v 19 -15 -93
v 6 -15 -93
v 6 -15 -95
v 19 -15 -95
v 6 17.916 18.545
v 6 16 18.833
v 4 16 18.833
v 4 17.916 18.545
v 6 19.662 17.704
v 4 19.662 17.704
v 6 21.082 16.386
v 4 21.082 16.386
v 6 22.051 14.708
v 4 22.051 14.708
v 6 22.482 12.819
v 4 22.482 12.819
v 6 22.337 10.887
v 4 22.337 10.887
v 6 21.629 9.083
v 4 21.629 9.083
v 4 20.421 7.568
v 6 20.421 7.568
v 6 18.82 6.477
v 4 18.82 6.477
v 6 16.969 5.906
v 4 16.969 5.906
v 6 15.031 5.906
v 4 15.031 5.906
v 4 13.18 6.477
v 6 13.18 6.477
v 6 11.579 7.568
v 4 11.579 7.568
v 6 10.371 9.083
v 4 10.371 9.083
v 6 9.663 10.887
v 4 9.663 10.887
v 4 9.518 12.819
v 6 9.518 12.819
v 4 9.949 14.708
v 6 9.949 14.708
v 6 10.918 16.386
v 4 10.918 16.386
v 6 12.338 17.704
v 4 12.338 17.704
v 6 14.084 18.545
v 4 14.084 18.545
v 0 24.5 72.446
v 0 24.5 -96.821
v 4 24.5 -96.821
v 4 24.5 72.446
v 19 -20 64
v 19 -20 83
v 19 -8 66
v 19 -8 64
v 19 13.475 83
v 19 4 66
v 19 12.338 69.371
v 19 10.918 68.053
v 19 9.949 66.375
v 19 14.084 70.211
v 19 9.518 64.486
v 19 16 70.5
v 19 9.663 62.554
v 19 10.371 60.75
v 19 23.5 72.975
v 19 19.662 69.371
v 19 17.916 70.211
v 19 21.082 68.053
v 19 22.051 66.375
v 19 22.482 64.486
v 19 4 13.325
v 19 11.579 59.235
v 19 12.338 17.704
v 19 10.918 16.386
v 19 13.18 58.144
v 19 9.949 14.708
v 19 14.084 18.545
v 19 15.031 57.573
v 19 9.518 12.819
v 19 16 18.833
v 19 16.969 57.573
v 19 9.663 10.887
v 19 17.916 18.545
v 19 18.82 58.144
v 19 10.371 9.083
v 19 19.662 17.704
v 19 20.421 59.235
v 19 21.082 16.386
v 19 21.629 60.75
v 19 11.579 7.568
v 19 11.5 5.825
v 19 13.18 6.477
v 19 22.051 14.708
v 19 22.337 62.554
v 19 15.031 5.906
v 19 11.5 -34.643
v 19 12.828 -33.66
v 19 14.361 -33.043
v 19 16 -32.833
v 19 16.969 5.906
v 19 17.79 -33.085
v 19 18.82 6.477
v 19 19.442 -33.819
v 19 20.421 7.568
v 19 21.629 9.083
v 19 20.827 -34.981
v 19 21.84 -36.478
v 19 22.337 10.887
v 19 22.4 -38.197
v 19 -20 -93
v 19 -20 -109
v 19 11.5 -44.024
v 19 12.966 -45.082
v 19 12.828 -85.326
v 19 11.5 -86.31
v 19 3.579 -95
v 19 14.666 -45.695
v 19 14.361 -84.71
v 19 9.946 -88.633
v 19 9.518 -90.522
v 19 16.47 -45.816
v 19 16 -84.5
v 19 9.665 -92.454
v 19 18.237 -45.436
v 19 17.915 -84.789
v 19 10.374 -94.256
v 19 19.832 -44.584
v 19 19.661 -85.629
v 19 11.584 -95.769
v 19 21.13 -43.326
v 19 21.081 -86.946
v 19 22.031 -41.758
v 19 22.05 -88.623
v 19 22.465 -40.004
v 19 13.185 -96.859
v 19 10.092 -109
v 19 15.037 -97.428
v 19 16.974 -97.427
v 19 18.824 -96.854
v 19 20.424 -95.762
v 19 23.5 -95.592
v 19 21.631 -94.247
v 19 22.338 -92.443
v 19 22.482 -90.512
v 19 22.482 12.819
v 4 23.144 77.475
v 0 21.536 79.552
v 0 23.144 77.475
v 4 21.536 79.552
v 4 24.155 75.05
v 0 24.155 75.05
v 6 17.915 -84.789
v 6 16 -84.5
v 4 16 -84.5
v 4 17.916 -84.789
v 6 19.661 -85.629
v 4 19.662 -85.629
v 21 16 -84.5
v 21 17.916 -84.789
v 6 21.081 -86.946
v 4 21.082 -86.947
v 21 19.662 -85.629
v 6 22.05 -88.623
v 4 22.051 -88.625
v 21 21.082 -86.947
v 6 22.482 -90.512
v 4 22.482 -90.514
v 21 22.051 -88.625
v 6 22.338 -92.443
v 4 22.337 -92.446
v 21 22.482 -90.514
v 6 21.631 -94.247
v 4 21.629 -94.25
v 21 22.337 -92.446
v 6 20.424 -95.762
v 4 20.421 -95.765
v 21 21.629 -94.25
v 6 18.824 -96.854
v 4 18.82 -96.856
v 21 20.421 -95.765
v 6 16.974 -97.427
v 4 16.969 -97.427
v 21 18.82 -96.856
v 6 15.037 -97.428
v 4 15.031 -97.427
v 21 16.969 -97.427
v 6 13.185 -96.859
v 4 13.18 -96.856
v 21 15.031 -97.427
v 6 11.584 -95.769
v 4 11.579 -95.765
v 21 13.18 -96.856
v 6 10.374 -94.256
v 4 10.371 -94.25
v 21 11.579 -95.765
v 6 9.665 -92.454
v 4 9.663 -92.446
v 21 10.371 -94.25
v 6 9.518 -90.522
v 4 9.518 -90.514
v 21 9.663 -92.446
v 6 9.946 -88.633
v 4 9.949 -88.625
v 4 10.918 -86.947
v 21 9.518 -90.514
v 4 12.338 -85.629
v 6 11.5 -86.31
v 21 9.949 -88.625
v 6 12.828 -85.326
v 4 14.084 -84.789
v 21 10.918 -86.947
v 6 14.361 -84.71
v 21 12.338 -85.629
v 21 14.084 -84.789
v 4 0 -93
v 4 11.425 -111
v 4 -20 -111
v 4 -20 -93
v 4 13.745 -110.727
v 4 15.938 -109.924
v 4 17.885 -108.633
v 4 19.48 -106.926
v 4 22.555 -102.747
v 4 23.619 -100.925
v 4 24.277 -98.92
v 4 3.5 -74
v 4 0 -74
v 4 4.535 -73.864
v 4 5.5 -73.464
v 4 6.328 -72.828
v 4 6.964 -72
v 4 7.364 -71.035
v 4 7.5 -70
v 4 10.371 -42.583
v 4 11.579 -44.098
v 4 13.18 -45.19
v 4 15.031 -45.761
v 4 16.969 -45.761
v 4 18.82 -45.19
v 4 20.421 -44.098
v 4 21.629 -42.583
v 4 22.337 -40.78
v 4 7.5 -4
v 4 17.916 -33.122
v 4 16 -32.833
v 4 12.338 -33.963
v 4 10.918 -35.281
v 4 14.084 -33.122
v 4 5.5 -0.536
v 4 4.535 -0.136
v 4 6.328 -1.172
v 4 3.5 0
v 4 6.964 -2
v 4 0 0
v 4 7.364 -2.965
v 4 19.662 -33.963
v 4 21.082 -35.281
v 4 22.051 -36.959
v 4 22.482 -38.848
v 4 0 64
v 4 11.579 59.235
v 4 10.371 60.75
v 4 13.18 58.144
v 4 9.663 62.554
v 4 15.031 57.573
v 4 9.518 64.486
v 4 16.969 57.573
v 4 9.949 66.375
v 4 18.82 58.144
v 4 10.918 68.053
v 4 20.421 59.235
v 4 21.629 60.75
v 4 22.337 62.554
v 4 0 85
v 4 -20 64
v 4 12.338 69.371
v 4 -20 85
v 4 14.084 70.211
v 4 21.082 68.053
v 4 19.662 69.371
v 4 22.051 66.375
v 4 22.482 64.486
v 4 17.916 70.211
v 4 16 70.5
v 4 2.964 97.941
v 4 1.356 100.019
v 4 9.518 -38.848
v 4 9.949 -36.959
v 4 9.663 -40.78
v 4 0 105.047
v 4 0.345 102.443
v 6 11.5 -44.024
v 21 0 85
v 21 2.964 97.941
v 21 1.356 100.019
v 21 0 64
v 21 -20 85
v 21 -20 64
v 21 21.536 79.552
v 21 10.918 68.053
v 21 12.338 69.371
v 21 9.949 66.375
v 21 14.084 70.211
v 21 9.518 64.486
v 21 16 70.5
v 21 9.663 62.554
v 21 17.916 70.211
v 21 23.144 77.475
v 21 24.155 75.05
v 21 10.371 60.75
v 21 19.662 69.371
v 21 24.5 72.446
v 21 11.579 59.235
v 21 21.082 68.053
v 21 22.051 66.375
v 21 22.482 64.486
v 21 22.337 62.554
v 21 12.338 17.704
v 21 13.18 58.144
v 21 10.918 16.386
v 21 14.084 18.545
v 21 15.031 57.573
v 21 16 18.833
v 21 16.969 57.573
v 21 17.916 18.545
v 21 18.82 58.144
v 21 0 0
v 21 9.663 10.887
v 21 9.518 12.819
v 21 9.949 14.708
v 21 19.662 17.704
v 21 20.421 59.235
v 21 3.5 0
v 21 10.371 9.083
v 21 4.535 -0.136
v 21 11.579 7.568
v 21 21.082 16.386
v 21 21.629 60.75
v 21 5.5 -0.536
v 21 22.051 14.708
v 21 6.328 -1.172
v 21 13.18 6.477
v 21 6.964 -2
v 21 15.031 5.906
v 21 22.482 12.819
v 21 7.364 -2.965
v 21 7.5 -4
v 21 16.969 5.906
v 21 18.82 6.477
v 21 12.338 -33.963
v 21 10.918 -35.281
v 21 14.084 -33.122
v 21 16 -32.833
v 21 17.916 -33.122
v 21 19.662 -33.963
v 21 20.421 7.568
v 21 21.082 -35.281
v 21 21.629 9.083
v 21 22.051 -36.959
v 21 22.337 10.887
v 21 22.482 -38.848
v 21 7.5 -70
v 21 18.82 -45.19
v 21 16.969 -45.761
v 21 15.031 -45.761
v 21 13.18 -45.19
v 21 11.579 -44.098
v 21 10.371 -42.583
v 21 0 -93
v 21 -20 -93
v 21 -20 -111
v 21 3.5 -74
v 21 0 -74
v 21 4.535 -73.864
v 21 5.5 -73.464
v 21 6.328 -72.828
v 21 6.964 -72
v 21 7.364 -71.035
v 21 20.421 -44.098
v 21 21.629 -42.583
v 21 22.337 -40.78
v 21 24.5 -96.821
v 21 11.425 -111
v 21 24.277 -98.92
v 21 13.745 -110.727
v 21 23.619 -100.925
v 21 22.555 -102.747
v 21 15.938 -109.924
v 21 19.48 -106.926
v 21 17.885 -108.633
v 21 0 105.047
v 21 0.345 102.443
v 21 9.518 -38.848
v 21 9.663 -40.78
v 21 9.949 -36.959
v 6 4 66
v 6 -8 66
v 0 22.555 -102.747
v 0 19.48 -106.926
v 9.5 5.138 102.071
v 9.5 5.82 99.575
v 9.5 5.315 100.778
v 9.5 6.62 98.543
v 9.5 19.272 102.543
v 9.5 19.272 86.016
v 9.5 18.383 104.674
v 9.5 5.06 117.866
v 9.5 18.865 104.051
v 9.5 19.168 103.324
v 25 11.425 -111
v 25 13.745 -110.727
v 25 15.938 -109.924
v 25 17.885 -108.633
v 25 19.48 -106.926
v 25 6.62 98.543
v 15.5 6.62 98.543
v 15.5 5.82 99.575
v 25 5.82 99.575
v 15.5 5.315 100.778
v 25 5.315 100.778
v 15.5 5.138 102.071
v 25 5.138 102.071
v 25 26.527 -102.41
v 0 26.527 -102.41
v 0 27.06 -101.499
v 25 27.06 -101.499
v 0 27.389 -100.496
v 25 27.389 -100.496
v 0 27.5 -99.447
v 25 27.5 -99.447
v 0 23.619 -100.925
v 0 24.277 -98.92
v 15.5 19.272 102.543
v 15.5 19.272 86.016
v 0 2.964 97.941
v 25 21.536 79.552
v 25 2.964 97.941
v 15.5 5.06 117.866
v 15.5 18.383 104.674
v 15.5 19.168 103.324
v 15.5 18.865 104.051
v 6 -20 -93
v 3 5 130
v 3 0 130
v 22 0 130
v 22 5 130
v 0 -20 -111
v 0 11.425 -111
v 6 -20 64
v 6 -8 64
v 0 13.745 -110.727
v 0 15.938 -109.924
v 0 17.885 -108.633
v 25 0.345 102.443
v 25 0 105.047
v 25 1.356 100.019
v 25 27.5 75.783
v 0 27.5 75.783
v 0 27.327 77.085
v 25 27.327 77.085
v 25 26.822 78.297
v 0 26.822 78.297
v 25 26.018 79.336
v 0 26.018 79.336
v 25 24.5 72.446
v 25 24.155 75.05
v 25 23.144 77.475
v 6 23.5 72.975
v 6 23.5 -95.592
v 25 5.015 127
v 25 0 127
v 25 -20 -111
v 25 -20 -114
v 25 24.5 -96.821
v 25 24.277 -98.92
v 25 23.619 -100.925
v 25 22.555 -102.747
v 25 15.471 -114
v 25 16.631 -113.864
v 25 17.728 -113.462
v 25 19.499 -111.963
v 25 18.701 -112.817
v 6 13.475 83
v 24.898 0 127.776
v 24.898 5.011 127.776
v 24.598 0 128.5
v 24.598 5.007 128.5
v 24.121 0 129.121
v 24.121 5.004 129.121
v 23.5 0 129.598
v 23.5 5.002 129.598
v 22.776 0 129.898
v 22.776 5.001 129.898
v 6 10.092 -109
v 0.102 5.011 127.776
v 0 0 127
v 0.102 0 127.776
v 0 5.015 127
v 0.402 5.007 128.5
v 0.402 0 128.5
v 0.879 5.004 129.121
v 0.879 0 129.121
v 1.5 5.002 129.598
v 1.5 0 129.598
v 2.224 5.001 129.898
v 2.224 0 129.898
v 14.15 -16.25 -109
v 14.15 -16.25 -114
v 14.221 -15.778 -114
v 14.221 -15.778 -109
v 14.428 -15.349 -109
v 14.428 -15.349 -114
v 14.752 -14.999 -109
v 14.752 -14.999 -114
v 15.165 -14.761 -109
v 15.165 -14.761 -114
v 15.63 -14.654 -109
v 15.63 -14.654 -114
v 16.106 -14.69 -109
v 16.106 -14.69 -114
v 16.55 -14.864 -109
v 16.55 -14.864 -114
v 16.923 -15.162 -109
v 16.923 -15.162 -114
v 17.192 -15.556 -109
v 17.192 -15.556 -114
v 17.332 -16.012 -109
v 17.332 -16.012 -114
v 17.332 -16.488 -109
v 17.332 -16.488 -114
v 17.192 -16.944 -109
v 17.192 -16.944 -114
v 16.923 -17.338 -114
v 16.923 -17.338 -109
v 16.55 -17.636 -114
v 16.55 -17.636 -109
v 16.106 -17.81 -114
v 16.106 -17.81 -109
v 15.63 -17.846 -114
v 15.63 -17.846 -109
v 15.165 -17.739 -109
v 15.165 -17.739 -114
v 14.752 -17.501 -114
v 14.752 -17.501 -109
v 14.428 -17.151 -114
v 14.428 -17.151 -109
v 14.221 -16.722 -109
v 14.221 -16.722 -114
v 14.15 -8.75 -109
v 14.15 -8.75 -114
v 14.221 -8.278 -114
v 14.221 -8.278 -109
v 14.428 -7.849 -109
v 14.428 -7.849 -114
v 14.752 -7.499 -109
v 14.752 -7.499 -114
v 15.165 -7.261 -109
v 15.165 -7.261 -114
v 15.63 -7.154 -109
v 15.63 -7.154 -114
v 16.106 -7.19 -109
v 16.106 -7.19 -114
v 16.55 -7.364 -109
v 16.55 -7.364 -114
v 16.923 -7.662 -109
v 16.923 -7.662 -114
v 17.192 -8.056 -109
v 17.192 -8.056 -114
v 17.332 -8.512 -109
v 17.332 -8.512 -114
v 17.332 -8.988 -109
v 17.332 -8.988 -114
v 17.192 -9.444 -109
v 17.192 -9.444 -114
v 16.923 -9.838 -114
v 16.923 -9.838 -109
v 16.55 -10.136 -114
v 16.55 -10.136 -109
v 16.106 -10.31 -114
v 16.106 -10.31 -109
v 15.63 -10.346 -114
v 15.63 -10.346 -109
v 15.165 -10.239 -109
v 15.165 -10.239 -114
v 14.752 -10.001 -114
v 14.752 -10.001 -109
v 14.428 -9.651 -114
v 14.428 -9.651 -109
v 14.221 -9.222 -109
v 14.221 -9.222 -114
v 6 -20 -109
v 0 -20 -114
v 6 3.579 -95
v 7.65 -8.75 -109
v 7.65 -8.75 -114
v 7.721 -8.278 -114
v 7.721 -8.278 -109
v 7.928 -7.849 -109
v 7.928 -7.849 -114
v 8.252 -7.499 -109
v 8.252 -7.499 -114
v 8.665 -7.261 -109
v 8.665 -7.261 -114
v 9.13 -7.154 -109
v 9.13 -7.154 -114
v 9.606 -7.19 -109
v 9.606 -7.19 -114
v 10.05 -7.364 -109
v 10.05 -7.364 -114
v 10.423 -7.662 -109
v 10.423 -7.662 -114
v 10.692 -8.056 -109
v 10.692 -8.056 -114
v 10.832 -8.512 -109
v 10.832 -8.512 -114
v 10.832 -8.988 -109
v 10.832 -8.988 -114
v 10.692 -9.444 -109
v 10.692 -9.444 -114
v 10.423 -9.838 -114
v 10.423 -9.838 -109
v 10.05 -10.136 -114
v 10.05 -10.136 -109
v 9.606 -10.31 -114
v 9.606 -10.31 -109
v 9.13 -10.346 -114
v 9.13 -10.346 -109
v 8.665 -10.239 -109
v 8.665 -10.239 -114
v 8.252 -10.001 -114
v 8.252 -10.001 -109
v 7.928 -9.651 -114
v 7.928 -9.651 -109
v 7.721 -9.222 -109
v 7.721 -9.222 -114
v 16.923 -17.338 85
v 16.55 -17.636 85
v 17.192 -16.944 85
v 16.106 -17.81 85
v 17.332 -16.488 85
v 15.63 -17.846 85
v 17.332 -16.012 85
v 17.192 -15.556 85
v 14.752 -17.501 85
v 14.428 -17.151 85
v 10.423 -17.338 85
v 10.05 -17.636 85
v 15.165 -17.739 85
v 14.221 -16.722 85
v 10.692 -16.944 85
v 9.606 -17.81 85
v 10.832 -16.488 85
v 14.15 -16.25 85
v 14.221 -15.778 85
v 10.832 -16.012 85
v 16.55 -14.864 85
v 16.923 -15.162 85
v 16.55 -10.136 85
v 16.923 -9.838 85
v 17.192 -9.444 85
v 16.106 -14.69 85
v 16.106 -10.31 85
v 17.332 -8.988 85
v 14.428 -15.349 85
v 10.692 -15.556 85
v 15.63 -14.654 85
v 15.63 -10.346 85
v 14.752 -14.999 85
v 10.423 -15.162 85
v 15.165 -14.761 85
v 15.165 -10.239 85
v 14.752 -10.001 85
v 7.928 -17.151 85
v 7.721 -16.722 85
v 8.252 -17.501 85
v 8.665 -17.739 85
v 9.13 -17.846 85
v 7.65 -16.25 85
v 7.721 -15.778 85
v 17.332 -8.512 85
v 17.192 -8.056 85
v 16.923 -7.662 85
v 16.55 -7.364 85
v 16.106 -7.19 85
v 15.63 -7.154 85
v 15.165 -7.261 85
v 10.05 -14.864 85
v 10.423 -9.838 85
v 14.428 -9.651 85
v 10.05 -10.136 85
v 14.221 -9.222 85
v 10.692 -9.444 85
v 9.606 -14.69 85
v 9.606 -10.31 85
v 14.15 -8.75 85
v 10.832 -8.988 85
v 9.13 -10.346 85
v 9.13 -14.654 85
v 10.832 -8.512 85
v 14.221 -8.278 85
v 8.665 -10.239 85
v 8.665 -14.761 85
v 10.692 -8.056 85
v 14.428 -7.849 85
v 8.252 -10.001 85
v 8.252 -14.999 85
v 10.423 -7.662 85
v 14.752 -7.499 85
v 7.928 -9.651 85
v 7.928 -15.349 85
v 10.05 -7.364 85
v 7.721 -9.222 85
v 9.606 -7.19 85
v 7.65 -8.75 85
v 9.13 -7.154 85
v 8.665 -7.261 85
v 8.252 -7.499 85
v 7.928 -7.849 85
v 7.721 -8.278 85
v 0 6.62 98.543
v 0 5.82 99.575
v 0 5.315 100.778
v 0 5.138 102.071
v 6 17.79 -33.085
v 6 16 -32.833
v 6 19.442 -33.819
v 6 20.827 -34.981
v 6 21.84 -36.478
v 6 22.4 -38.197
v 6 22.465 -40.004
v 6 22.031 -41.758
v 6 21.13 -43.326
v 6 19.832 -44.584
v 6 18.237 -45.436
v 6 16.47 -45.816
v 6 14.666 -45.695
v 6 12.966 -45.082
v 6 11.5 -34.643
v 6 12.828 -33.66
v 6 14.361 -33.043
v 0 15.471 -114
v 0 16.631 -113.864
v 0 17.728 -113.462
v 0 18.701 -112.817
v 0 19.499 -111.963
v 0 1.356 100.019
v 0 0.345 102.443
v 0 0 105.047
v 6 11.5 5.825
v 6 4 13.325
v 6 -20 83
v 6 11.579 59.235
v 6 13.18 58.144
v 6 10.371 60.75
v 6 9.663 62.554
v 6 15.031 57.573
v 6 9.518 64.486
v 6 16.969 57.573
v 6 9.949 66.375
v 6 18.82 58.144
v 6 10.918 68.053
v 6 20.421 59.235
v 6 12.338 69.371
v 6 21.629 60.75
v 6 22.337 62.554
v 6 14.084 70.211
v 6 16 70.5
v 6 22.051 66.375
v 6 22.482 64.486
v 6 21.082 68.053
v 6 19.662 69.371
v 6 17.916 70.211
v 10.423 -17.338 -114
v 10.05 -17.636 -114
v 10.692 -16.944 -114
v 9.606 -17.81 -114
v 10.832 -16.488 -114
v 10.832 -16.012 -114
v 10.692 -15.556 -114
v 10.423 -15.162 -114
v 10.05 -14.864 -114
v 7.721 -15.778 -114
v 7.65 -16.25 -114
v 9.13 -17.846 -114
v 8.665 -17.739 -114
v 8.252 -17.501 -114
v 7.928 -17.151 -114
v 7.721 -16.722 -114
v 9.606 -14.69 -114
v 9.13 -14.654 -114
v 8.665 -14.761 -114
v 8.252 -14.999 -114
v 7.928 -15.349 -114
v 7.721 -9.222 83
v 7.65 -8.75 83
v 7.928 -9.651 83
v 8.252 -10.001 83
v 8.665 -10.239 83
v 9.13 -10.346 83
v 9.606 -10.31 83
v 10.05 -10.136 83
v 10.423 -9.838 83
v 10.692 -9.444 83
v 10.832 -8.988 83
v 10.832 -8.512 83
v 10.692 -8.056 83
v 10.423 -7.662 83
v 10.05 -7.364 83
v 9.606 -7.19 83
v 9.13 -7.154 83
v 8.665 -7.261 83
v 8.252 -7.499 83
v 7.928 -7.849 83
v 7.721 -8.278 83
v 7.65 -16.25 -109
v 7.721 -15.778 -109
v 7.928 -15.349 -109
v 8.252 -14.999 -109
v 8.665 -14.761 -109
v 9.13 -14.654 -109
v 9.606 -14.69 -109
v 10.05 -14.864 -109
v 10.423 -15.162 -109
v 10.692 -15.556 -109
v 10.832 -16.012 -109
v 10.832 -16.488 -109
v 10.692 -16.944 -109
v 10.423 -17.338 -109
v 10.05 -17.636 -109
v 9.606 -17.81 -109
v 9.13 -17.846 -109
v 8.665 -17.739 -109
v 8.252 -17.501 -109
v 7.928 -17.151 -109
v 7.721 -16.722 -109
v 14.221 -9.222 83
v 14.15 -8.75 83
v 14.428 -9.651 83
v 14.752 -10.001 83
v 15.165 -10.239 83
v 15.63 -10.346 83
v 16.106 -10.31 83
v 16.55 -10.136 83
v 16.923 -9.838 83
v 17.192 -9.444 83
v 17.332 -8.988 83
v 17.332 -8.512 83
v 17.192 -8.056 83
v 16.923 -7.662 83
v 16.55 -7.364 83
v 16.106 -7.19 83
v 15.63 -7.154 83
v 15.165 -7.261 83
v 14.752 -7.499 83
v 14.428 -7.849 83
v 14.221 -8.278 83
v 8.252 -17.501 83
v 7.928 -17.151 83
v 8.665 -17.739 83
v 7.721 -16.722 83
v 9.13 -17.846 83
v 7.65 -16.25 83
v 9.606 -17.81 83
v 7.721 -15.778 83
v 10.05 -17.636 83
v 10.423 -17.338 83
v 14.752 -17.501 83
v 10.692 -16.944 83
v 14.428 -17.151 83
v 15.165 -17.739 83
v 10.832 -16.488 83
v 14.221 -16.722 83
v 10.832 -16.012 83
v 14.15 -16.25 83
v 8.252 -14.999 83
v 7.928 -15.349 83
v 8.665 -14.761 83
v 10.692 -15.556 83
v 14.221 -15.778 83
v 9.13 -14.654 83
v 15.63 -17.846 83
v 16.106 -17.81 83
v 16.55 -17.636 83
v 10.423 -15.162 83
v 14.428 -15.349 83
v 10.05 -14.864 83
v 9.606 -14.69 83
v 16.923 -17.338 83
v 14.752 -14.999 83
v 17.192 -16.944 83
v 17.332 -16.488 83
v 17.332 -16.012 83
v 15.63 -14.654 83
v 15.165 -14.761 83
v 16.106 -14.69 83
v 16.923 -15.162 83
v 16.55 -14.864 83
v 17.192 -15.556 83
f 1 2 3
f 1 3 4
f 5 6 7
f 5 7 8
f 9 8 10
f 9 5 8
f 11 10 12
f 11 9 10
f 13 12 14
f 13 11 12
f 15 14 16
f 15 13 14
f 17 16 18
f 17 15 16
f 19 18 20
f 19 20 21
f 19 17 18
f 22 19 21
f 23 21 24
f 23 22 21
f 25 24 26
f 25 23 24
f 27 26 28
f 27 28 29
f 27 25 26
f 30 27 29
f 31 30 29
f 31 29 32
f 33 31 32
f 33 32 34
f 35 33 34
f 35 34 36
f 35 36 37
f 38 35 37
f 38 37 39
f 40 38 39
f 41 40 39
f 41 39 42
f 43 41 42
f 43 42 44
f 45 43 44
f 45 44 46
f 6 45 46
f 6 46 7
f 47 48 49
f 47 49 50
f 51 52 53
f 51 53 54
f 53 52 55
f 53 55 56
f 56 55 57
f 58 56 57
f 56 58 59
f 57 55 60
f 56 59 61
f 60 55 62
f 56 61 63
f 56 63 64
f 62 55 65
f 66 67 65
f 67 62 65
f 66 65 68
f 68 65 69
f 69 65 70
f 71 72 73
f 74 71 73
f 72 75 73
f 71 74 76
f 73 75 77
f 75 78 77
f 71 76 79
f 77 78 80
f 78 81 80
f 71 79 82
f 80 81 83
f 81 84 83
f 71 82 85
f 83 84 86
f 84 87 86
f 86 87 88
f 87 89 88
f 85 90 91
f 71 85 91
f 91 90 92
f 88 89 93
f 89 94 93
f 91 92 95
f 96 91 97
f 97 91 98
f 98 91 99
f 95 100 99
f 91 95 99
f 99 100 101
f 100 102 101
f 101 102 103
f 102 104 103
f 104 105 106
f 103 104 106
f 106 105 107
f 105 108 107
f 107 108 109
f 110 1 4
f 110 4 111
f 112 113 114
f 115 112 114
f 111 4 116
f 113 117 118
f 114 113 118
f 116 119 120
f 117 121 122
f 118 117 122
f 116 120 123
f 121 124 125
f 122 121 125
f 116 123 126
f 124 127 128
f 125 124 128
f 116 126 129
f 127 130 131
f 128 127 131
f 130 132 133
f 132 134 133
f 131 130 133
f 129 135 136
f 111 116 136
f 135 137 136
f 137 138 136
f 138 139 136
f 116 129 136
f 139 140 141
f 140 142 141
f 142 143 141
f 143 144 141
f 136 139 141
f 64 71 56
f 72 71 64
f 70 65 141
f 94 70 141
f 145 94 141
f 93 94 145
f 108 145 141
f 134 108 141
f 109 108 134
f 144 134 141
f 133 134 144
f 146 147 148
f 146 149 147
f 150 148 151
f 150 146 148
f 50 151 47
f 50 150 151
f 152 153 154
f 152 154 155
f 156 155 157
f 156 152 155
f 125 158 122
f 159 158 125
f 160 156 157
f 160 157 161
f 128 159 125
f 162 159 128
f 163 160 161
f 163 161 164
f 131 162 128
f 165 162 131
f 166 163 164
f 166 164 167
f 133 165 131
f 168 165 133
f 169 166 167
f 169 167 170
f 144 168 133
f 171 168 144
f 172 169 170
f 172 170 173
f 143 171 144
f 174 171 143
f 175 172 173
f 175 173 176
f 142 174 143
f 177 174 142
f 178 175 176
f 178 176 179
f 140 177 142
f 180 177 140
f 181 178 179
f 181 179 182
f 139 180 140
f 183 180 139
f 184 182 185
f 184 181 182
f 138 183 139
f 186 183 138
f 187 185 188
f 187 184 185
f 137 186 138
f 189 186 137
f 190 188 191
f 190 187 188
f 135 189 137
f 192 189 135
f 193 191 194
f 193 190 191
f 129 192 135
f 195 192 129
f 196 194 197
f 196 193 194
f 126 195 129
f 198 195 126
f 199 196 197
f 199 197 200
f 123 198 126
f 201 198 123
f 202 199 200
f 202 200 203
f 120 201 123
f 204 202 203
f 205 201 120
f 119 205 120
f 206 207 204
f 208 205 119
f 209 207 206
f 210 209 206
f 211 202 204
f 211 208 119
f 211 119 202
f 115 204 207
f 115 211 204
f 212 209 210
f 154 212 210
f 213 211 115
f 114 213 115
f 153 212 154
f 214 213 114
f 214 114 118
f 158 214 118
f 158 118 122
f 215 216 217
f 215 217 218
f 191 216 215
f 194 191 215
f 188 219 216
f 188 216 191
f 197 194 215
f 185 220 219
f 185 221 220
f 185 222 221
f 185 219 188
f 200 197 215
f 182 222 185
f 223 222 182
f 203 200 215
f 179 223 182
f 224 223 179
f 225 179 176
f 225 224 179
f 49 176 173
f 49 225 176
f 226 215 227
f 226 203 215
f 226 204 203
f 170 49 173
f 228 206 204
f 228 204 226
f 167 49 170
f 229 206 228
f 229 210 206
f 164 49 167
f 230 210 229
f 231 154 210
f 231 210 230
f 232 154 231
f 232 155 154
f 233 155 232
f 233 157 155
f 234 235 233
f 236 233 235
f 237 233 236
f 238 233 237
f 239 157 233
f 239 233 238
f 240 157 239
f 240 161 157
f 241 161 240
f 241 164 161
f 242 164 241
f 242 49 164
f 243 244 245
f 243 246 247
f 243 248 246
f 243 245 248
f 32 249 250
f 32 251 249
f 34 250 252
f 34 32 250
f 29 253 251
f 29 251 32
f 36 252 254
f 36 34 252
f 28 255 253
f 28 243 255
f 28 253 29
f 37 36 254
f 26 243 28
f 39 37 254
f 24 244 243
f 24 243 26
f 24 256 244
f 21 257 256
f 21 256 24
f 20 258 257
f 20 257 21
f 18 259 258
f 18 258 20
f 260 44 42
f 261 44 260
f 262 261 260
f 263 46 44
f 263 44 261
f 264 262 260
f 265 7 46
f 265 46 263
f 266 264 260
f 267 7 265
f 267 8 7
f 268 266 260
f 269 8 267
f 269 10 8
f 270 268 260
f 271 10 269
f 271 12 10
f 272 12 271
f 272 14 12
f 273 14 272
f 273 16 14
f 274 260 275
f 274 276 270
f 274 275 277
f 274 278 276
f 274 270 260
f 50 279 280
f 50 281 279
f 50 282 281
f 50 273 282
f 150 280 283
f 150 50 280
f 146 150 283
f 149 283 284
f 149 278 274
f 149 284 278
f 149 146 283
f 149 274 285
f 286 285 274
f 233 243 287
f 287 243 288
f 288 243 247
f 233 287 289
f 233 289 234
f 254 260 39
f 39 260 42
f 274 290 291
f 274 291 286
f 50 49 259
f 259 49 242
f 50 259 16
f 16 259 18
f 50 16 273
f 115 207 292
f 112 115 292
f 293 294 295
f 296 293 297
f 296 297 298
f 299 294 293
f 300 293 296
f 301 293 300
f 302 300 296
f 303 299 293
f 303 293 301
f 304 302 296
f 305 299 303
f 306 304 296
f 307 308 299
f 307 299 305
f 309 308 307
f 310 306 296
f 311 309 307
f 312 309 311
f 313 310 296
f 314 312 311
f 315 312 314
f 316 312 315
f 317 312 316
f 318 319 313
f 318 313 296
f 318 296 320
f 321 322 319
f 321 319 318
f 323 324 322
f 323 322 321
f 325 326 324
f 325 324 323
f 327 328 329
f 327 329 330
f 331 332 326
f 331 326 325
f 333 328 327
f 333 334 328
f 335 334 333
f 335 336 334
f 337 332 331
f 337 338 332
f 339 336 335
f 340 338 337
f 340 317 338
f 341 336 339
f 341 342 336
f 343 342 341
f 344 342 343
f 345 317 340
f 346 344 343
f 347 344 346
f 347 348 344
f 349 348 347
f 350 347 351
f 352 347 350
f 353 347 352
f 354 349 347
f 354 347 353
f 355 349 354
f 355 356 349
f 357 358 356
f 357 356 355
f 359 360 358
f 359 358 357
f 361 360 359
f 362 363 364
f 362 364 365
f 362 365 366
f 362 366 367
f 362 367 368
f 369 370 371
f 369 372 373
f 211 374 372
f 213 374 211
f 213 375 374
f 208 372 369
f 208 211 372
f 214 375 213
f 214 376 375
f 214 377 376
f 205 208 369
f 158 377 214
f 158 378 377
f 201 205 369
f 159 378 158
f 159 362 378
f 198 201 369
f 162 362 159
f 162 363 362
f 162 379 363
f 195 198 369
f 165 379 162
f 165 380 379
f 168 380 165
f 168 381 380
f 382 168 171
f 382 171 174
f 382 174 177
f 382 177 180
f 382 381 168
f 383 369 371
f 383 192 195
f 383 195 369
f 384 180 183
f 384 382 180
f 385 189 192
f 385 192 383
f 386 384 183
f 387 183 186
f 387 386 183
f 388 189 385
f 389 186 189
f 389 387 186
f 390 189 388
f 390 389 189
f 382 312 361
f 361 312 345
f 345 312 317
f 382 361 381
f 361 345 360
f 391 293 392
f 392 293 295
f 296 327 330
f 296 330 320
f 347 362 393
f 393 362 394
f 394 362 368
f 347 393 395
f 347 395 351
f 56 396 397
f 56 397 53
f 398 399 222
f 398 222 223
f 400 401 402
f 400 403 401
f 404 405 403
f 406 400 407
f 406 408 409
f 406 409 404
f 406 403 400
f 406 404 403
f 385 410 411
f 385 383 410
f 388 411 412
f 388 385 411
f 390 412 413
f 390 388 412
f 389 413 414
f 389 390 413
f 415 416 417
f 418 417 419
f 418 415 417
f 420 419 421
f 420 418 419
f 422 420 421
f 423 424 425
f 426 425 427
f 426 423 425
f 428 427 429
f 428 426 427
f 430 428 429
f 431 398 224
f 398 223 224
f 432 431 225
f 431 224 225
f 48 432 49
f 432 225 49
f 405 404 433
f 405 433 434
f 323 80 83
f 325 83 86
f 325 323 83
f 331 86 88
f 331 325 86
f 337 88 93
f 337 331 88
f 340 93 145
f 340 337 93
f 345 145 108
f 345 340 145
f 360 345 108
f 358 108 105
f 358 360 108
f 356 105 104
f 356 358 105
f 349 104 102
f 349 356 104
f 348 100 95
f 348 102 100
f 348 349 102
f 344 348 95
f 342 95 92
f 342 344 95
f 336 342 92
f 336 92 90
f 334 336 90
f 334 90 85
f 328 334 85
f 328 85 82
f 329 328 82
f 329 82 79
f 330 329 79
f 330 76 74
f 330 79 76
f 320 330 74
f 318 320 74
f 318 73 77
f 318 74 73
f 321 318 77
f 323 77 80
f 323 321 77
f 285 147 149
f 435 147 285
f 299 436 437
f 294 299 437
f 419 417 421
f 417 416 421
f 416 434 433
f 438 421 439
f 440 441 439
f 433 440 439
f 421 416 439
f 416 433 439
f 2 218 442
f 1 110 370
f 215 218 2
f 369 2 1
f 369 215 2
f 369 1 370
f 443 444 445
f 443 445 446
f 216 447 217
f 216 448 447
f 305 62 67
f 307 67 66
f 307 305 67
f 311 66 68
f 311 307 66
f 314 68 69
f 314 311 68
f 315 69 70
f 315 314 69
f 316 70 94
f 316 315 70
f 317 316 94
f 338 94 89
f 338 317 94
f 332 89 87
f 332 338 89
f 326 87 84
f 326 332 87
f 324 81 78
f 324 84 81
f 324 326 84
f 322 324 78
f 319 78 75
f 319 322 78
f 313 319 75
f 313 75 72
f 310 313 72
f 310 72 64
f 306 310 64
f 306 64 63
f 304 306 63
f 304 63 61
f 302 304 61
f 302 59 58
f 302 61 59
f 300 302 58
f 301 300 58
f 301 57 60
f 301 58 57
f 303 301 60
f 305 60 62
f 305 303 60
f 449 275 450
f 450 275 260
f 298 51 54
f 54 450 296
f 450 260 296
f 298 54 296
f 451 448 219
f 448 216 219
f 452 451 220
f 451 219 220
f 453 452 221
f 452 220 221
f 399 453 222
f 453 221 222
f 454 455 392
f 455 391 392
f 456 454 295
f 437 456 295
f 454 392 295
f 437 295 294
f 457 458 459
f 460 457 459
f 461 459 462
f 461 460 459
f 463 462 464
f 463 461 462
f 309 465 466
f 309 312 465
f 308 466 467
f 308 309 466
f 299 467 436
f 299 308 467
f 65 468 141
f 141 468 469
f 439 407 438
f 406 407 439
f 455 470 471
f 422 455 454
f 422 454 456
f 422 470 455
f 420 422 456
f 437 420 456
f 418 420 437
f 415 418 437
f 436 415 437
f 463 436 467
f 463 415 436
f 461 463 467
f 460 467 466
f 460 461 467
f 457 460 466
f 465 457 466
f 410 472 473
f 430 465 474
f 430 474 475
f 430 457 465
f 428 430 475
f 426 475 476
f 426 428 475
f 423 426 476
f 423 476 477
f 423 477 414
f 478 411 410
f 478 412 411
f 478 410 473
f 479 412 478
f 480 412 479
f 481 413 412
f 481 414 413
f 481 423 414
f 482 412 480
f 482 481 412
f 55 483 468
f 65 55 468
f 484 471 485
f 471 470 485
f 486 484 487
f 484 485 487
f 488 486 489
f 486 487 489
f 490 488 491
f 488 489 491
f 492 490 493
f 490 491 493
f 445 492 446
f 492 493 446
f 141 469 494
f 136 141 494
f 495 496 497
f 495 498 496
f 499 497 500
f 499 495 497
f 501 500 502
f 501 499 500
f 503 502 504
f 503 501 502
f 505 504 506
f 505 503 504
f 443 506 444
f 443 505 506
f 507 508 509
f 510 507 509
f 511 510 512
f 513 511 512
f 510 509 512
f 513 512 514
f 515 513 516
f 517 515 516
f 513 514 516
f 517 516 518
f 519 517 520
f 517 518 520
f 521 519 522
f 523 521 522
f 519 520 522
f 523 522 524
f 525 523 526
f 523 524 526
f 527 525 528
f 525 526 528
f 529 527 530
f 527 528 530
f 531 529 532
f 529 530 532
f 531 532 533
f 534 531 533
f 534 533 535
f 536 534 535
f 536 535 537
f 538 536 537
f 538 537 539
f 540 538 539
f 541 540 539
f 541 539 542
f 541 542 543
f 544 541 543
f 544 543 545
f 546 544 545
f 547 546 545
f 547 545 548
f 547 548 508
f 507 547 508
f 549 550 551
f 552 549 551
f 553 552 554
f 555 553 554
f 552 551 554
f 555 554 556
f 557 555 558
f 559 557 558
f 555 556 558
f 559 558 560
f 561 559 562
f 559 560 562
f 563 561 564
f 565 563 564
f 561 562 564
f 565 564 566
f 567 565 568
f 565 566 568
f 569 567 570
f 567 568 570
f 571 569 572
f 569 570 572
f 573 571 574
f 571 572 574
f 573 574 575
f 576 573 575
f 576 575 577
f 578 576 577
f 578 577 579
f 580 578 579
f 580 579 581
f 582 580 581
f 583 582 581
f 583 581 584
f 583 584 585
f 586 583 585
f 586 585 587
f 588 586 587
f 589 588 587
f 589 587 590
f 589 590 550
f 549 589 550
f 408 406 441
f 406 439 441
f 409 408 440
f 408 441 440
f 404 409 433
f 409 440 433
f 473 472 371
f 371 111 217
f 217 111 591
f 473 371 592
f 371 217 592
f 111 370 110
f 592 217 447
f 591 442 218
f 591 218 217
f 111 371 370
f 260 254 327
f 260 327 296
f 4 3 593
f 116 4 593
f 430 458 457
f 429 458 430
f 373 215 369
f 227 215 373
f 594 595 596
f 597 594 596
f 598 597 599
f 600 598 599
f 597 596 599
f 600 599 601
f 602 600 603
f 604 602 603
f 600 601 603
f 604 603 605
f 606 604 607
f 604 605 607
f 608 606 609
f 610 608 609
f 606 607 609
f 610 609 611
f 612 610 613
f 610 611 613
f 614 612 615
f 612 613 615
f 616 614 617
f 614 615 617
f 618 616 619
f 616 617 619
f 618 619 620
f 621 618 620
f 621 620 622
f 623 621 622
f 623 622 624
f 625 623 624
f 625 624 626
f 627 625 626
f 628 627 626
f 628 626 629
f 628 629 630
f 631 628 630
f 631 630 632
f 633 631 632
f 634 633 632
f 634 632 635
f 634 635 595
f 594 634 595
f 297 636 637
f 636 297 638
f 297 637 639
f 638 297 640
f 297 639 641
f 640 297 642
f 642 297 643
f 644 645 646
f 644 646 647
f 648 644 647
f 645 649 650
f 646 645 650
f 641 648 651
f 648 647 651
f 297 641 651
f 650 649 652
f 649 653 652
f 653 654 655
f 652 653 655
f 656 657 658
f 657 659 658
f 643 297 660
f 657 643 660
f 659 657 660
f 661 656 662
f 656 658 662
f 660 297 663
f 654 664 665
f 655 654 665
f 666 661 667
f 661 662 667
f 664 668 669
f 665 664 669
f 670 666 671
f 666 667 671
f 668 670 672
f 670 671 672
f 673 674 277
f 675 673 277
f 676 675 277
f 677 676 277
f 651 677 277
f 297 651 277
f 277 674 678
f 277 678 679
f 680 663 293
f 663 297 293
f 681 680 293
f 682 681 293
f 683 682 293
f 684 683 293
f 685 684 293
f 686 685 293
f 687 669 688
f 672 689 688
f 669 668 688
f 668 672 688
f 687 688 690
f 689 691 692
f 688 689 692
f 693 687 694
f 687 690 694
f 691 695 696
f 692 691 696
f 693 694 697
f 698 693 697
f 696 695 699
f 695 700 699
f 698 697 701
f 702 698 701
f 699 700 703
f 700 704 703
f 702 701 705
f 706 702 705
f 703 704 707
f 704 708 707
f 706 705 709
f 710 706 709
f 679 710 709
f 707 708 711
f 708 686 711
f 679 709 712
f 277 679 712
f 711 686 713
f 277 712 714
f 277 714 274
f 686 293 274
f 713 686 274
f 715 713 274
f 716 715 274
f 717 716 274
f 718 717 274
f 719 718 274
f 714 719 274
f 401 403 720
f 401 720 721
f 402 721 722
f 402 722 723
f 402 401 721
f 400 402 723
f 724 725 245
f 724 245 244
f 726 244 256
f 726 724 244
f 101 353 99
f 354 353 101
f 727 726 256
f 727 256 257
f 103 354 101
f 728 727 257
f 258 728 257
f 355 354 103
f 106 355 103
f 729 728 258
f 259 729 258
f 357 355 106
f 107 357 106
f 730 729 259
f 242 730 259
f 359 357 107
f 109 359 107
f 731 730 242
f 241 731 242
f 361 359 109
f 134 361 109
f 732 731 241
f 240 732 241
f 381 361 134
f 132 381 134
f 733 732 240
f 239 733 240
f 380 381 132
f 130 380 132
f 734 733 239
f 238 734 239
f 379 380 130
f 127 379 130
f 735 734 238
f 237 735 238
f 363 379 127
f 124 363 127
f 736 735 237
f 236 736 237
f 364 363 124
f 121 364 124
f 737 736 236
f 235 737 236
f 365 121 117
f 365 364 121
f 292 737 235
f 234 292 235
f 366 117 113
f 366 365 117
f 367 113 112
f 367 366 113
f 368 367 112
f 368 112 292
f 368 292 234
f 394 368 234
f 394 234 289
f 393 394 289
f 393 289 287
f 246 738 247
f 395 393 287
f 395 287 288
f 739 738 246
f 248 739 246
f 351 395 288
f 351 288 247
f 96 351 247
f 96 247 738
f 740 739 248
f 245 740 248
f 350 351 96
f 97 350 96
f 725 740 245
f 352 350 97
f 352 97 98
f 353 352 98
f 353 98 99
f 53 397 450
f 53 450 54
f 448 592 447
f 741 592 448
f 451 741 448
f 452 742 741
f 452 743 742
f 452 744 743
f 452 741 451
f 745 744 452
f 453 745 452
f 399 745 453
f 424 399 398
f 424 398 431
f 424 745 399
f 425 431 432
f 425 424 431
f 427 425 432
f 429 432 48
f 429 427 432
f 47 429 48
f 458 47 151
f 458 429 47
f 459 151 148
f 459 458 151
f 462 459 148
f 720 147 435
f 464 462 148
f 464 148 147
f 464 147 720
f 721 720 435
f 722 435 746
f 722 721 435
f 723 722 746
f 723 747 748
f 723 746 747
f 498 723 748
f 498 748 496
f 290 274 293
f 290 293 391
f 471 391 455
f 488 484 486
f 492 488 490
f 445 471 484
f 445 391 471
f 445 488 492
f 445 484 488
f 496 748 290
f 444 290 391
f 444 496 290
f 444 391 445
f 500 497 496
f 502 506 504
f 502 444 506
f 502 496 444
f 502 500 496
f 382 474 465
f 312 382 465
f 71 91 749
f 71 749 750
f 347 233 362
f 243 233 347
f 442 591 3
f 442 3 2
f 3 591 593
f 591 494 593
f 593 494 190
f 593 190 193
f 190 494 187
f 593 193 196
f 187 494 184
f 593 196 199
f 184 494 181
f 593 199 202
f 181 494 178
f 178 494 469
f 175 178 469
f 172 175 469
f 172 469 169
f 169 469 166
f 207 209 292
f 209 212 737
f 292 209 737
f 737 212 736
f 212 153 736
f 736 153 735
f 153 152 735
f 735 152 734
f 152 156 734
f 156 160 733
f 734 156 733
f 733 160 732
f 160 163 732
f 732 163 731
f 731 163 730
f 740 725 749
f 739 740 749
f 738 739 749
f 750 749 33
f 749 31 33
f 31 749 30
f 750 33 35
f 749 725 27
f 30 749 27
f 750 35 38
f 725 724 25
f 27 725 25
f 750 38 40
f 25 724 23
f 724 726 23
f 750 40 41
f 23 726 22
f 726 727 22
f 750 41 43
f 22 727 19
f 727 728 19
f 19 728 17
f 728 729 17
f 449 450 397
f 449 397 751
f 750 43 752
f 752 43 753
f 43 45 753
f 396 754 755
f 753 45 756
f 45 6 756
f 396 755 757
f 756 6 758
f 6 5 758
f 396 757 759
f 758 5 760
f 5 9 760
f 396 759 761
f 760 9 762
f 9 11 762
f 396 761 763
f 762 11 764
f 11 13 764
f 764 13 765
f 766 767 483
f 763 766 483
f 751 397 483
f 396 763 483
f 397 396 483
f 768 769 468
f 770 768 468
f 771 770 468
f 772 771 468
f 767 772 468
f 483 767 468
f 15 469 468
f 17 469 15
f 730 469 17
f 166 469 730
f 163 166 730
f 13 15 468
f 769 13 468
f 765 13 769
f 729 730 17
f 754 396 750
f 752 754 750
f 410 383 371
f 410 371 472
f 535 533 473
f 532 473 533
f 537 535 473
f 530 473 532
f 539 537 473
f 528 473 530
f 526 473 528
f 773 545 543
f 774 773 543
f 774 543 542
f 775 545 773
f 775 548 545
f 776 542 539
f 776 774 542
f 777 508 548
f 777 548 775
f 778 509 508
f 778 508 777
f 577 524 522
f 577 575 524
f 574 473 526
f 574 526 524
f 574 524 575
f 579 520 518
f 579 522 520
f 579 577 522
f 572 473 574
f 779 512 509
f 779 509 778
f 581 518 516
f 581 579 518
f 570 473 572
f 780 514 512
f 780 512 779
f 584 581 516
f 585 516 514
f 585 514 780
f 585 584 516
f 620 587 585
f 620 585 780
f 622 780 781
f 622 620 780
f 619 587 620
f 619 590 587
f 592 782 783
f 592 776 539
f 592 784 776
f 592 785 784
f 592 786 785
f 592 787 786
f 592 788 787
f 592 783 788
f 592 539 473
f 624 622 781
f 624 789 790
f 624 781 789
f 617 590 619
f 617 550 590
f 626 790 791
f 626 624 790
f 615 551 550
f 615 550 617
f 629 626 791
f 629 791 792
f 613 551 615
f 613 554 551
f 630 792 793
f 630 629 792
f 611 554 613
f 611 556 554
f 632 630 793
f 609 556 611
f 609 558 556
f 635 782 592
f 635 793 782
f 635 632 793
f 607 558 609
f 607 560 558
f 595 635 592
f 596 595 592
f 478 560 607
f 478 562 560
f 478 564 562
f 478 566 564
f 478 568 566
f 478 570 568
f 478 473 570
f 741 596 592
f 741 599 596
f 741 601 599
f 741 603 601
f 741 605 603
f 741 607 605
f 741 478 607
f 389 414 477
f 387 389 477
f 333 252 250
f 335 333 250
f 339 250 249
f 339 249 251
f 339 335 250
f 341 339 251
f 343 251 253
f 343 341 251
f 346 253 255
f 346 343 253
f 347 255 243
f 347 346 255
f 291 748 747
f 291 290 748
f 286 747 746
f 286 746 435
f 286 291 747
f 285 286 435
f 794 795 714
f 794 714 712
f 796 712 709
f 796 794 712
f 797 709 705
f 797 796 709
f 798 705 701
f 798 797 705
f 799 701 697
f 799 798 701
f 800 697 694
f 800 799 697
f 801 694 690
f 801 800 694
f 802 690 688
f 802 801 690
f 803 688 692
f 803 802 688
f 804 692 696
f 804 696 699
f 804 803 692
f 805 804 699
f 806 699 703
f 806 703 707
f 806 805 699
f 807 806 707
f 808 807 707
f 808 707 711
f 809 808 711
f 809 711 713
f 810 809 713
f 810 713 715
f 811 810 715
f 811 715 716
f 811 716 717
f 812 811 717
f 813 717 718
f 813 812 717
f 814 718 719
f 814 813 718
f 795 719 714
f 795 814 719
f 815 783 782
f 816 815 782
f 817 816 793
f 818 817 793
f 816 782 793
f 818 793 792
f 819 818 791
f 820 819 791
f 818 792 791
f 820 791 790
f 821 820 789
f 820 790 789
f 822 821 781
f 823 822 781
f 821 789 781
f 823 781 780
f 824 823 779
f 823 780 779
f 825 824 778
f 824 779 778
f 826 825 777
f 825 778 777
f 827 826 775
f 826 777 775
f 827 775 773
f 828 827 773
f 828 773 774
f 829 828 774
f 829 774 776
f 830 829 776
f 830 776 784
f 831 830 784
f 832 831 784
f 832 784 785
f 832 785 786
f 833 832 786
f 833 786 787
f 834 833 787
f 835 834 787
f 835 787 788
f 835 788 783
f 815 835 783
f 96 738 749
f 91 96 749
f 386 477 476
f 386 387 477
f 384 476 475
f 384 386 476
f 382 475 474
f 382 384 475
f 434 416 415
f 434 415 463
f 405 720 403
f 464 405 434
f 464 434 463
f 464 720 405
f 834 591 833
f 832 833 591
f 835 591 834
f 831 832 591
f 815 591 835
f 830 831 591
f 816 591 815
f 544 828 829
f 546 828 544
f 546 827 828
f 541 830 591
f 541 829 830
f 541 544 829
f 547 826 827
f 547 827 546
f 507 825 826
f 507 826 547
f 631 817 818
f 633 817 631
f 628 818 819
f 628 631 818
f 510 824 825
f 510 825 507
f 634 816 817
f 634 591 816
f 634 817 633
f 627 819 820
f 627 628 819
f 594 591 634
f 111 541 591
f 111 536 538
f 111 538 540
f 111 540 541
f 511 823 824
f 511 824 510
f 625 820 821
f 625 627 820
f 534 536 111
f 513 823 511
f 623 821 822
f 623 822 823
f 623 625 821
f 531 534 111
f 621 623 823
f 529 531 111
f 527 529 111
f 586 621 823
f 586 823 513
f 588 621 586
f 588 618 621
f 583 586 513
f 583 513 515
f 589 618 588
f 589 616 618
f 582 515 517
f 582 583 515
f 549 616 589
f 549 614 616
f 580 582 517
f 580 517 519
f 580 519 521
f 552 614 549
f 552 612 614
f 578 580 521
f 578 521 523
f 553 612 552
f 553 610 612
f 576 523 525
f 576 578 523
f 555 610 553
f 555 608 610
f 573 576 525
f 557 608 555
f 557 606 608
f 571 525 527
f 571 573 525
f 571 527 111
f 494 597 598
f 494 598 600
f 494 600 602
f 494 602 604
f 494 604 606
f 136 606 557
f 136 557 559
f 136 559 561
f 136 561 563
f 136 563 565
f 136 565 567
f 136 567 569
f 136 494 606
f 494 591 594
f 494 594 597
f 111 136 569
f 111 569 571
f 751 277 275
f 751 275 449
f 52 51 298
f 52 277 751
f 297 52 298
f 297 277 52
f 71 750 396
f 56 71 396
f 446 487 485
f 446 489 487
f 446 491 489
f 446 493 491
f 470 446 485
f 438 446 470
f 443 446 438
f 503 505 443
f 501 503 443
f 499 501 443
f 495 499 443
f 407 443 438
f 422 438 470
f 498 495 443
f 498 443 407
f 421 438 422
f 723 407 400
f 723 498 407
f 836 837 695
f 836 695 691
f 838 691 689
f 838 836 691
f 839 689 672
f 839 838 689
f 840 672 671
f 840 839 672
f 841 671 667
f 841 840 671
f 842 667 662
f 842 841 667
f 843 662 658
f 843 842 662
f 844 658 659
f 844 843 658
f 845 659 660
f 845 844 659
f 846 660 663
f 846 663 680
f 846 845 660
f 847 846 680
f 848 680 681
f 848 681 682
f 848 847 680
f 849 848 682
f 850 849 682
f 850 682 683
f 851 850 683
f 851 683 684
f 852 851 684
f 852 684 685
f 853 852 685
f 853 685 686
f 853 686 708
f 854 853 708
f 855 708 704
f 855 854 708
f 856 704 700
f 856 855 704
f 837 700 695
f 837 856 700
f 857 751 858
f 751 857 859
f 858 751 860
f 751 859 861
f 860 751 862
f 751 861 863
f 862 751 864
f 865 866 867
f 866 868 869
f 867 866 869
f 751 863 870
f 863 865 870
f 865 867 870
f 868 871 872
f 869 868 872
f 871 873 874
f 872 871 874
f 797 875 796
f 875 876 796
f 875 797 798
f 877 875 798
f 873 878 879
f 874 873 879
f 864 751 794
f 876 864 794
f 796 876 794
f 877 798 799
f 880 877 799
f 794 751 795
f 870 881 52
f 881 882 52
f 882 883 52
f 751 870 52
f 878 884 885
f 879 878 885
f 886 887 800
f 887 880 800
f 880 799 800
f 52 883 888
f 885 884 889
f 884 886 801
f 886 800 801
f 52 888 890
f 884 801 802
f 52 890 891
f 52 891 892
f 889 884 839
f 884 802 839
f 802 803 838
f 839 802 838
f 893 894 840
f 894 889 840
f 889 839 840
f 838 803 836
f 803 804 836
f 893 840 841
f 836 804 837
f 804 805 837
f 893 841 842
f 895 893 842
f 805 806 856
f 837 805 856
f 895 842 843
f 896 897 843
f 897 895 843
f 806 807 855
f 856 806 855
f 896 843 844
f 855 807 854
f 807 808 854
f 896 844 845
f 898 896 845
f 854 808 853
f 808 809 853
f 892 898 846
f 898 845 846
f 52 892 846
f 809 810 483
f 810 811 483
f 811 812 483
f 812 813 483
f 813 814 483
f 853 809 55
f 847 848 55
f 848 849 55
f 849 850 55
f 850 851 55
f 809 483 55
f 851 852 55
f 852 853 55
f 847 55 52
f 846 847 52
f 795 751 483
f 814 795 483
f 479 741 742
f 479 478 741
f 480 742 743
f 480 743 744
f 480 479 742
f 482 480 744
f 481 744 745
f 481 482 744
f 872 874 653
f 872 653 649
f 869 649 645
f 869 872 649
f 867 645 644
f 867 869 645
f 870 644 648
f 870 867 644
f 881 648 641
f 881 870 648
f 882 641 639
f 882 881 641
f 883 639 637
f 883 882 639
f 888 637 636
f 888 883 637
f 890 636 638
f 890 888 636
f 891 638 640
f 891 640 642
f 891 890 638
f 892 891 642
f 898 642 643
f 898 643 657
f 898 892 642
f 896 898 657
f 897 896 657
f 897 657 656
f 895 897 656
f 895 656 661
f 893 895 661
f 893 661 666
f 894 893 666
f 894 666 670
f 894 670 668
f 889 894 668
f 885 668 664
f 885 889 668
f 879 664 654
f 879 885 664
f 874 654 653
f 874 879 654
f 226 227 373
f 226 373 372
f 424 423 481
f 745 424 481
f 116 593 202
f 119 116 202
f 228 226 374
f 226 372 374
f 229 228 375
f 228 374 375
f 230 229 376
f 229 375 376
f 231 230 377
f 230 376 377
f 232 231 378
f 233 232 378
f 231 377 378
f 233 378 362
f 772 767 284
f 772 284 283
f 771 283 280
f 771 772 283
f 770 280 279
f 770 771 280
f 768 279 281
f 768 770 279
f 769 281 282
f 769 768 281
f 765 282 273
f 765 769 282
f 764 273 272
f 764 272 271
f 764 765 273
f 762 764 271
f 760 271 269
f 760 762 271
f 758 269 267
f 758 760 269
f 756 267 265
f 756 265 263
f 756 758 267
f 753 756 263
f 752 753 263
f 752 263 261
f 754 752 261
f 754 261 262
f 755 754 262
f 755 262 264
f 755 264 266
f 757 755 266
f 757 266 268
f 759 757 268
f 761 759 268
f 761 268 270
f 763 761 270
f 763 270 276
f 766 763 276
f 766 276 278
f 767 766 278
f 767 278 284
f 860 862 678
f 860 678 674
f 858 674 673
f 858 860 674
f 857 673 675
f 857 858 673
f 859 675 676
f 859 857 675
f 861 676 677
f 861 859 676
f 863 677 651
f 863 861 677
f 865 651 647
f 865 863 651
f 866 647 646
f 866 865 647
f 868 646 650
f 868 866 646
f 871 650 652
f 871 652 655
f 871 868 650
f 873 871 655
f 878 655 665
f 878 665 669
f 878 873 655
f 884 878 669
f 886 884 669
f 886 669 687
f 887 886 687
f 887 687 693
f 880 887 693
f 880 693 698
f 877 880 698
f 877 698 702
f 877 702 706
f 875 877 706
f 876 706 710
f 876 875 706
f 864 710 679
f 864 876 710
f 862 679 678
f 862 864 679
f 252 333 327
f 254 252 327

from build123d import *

# Parameters (mm, degrees)
BOSS_EXTRUDE1_DEPTH      = 25
CUT_EXTRUDE1_DEPTH       = 4
FILLET1_R                = 4
FILLET2_R                = 10
FILLET3_R                = 5
FILLET4_R                = 3
BOSS_EXTRUDE2_DEPTH      = 3
BOSS_EXTRUDE2_DEPTH_BACK = 3
FILLET5_R                = 3
SKETCH6_W                = 13
SKETCH6_H                = 14
BOSS_EXTRUDE3_DEPTH      = 20
BOSS_EXTRUDE4_DEPTH      = 20
SKETCH9_W                = 13
SKETCH9_H                = 2
BOSS_EXTRUDE5_DEPTH      = 8
SKETCH7_W                = 13
SKETCH7_H                = 2
CUT_EXTRUDE2_DEPTH       = 5
SKETCH11_R               = 1.6
CUT_EXTRUDE3_DEPTH       = 19
CUT_EXTRUDE4_START       = -2
SKETCH12_R               = 1.6
CUT_EXTRUDE4_DEPTH       = 2
CUT_EXTRUDE5_DEPTH       = 6.5
CUT_EXTRUDE5_DEPTH_BACK  = 6.5
CUT_EXTRUDE6_START       = -17
SKETCH15_R               = 6.5
CUT_EXTRUDE6_DEPTH       = 17


with BuildPart() as part:
    # Sketch1 → Boss-Extrude1 (new body)
    with BuildSketch(Plane(origin=(0, 0, 0), x_dir=(0, 0, -1), z_dir=(1, 0, 0))):
        Polygon((0, 0), (-130, 0), (-130, 5), (-100.000366453, 5.148280317), (-77.868517379, 27.5), (101.088229162, 27.5), (114, 18), (114, 0), (74, 0), (74, 7.5), (0, 7.5), align=None)
    extrude(amount=BOSS_EXTRUDE1_DEPTH)

    # Sketch4 → Cut-Extrude1 (cut)
    with BuildSketch(Plane(origin=(25, 0, 0), x_dir=(0, 0, -1), z_dir=(1, 0, 0))):
        Polygon((-100.876178749, 0), (0, 0), (111, 0), (111, 3), (111, 16.482758557), (100.103496394, 24.5), (-76.617181678, 24.5), align=None)
    cut_extrude1 = extrude(amount=-CUT_EXTRUDE1_DEPTH, mode=Mode.SUBTRACT)

    # Mirror2: Cut-Extrude1 across plane
    add(cut_extrude1.mirror(Plane(origin=(12.5, 0, 0), x_dir=(0, 0, 1), z_dir=(1, 0, 0))), mode=Mode.SUBTRACT)

    # Fillet1
    fillet1_edges = [part.edges().sort_by_distance(p)[0] for p in [
        (12.5, 7.5, -74),
        (12.5, 7.5, 0),
    ]]
    fillet(fillet1_edges, radius=FILLET1_R)

    # Fillet2
    fillet2_edges = [part.edges().sort_by_distance(p)[0] for p in [
        (23, 0, 100.876178749),
        (23, 24.5, 76.617181678),
        (23, 24.5, -100.103496394),
        (23, 16.482758557, -111),
        (2, 0, 100.876178749),
        (2, 16.482758557, -111),
        (2, 24.5, -100.103496394),
        (2, 24.5, 76.617181678),
    ]]
    fillet(fillet2_edges, radius=FILLET2_R)

    # Fillet3
    fillet3_edges = [part.edges().sort_by_distance(p)[0] for p in [
        (12.5, 5.148280317, 100.000366453),
        (12.5, 27.5, 77.868517379),
        (12.5, 27.5, -101.088229162),
        (12.5, 18, -114),
    ]]
    fillet(fillet3_edges, radius=FILLET3_R)

    # Fillet4
    fillet4_edges = [part.edges().sort_by_distance(p)[0] for p in [
        (0, 2.5, 130),
        (25, 2.5, 130),
    ]]
    fillet(fillet4_edges, radius=FILLET4_R)

    # Sketch5 → Boss-Extrude2 (add, two sides: drawn at the far end of the back side and taken through both)
    with BuildSketch(Plane(origin=(12.5, 0, 0), x_dir=(0, 0, -1), z_dir=(1, 0, 0)).offset(-BOSS_EXTRUDE2_DEPTH_BACK)):
        Polygon((-117.8659777, 5.059975288), (-103.793914836, 19.271838176), (-72.605250228, 19.271838176), (-95.8659777, 5.059975288), align=None)
    extrude(amount=BOSS_EXTRUDE2_DEPTH + BOSS_EXTRUDE2_DEPTH_BACK)

    # Fillet5
    fillet5_edges = [part.edges().sort_by_distance(p)[0] for p in [
        (12.5, 19.271838176, 103.793914836),
    ]]
    fillet(fillet5_edges, radius=FILLET5_R)

    # Sketch6 → Boss-Extrude3 (add)
    with BuildSketch(Plane.XZ):
        Polygon((0, -111), (4, -111), (4, -93), (21, -93), (21, -111), (25, -111), (25, -114), (0, -114), align=None)
        with Locations((12.5, -102)):
            Rectangle(SKETCH6_W, SKETCH6_H, mode=Mode.SUBTRACT)
    extrude(amount=BOSS_EXTRUDE3_DEPTH)

    # Sketch8 → Boss-Extrude4 (add)
    with BuildSketch(Plane.XZ):
        Polygon((21, 85), (4, 85), (4, 64), (6, 64), (6, 83), (19, 83), (19, 64), (21, 64), align=None)
    extrude(amount=BOSS_EXTRUDE4_DEPTH)

    # Sketch9 → Boss-Extrude5 (add)
    with BuildSketch(Plane.XZ):
        with Locations((12.5, 65)):
            Rectangle(SKETCH9_W, SKETCH9_H)
    extrude(amount=BOSS_EXTRUDE5_DEPTH)

    # Sketch7 → Cut-Extrude2 (cut)
    with BuildSketch(Plane.XZ.offset(20)):
        with Locations((12.5, -94)):
            Rectangle(SKETCH7_W, SKETCH7_H)
    extrude(amount=-CUT_EXTRUDE2_DEPTH, mode=Mode.SUBTRACT)

    # Sketch11 → Cut-Extrude3 (cut)
    with BuildSketch(Plane(origin=(0, 0, -114), x_dir=(-1, 0, 0), z_dir=(0, 0, -1))):
        with Locations((-15.75, -16.25)):
            Circle(SKETCH11_R)
        with Locations((-15.75, -8.75)):
            Circle(SKETCH11_R)
        with Locations((-9.25, -8.75)):
            Circle(SKETCH11_R)
        with Locations((-9.25, -16.25)):
            Circle(SKETCH11_R)
    extrude(amount=-CUT_EXTRUDE3_DEPTH, mode=Mode.SUBTRACT)

    # Sketch12 → Cut-Extrude4 (cut)
    with BuildSketch(Plane.XY.offset(85).offset(CUT_EXTRUDE4_START)):
        with Locations(Location((15.75, -16.25, 0), (0, 0, 180))):
            Circle(SKETCH12_R)
        with Locations(Location((9.25, -16.25, 0), (0, 0, 180))):
            Circle(SKETCH12_R)
        with Locations(Location((9.25, -8.75, 0), (0, 0, 180))):
            Circle(SKETCH12_R)
        with Locations(Location((15.75, -8.75, 0), (0, 0, 180))):
            Circle(SKETCH12_R)
    extrude(amount=CUT_EXTRUDE4_DEPTH, mode=Mode.SUBTRACT)

    # Sketch14 → Cut-Extrude5 (cut, two sides: drawn at the far end of the back side and taken through both)
    with BuildSketch(Plane(origin=(12.5, 0, 0), x_dir=(0, 0, -1), z_dir=(1, 0, 0)).offset(-CUT_EXTRUDE5_DEPTH_BACK)):
        Polygon((-83, 0), (-83, 13.475167258), (-72.975167258, 23.5), (95.592427597, 23.5), (109, 10.092427597), (109, 0), (95, 0), (95, 3.57939317), (87.07939317, 11.5), (-5.825100808, 11.5), (-13.325100808, 4), (-66, 4), (-66, 0), align=None)
    extrude(amount=CUT_EXTRUDE5_DEPTH + CUT_EXTRUDE5_DEPTH_BACK, mode=Mode.SUBTRACT)

    # Sketch15 → Cut-Extrude6 (cut)
    with BuildSketch(Plane.ZY.offset(-4).offset(CUT_EXTRUDE6_START)):
        with Locations((-91, 16)):
            Circle(SKETCH15_R)
        with Locations((-39.333333333, 16)):
            Circle(SKETCH15_R)
        with Locations((64, 16)):
            Circle(SKETCH15_R)
        with Locations((12.333333333, 16)):
            Circle(SKETCH15_R)
    extrude(amount=CUT_EXTRUDE6_DEPTH, mode=Mode.SUBTRACT)


solid = part.part
